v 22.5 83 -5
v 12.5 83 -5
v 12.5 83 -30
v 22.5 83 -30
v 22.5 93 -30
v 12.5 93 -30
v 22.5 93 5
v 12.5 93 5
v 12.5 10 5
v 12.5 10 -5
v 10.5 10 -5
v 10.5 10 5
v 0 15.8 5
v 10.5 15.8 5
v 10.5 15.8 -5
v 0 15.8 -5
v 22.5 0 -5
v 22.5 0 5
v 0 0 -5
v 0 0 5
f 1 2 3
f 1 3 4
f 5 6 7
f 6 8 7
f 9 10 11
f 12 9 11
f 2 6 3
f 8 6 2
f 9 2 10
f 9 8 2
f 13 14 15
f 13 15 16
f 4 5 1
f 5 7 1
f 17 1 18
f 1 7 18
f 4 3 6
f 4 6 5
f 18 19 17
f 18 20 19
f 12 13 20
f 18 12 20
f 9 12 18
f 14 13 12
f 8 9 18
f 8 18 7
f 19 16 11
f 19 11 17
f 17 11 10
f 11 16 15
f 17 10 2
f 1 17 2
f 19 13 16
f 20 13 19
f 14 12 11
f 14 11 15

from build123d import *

# Parameters (mm, degrees)
F1_DEPTH = 5
F2_W     = 10
F2_H     = 10
F3_DEPTH = 25


with BuildPart() as f1:
    # F0 (on Top) → F1 (new body, symmetric)
    with BuildSketch(Plane.XY):
        Polygon((22.5, 0), (22.5, 93), (12.5, 93), (12.5, 10), (10.5, 10), (10.5, 15.8), (0, 15.8), (0, 0), align=None)
    extrude(amount=F1_DEPTH, both=True)

    # F2 (on face) → F3 (join)
    with BuildSketch(Plane(origin=(0, 0, -5), x_dir=(1, 0, 0), z_dir=(0, 0, -1))):
        with Locations((17.5, -88)):
            Rectangle(F2_W, F2_H)
    extrude(amount=F3_DEPTH)


solid = f1.part
